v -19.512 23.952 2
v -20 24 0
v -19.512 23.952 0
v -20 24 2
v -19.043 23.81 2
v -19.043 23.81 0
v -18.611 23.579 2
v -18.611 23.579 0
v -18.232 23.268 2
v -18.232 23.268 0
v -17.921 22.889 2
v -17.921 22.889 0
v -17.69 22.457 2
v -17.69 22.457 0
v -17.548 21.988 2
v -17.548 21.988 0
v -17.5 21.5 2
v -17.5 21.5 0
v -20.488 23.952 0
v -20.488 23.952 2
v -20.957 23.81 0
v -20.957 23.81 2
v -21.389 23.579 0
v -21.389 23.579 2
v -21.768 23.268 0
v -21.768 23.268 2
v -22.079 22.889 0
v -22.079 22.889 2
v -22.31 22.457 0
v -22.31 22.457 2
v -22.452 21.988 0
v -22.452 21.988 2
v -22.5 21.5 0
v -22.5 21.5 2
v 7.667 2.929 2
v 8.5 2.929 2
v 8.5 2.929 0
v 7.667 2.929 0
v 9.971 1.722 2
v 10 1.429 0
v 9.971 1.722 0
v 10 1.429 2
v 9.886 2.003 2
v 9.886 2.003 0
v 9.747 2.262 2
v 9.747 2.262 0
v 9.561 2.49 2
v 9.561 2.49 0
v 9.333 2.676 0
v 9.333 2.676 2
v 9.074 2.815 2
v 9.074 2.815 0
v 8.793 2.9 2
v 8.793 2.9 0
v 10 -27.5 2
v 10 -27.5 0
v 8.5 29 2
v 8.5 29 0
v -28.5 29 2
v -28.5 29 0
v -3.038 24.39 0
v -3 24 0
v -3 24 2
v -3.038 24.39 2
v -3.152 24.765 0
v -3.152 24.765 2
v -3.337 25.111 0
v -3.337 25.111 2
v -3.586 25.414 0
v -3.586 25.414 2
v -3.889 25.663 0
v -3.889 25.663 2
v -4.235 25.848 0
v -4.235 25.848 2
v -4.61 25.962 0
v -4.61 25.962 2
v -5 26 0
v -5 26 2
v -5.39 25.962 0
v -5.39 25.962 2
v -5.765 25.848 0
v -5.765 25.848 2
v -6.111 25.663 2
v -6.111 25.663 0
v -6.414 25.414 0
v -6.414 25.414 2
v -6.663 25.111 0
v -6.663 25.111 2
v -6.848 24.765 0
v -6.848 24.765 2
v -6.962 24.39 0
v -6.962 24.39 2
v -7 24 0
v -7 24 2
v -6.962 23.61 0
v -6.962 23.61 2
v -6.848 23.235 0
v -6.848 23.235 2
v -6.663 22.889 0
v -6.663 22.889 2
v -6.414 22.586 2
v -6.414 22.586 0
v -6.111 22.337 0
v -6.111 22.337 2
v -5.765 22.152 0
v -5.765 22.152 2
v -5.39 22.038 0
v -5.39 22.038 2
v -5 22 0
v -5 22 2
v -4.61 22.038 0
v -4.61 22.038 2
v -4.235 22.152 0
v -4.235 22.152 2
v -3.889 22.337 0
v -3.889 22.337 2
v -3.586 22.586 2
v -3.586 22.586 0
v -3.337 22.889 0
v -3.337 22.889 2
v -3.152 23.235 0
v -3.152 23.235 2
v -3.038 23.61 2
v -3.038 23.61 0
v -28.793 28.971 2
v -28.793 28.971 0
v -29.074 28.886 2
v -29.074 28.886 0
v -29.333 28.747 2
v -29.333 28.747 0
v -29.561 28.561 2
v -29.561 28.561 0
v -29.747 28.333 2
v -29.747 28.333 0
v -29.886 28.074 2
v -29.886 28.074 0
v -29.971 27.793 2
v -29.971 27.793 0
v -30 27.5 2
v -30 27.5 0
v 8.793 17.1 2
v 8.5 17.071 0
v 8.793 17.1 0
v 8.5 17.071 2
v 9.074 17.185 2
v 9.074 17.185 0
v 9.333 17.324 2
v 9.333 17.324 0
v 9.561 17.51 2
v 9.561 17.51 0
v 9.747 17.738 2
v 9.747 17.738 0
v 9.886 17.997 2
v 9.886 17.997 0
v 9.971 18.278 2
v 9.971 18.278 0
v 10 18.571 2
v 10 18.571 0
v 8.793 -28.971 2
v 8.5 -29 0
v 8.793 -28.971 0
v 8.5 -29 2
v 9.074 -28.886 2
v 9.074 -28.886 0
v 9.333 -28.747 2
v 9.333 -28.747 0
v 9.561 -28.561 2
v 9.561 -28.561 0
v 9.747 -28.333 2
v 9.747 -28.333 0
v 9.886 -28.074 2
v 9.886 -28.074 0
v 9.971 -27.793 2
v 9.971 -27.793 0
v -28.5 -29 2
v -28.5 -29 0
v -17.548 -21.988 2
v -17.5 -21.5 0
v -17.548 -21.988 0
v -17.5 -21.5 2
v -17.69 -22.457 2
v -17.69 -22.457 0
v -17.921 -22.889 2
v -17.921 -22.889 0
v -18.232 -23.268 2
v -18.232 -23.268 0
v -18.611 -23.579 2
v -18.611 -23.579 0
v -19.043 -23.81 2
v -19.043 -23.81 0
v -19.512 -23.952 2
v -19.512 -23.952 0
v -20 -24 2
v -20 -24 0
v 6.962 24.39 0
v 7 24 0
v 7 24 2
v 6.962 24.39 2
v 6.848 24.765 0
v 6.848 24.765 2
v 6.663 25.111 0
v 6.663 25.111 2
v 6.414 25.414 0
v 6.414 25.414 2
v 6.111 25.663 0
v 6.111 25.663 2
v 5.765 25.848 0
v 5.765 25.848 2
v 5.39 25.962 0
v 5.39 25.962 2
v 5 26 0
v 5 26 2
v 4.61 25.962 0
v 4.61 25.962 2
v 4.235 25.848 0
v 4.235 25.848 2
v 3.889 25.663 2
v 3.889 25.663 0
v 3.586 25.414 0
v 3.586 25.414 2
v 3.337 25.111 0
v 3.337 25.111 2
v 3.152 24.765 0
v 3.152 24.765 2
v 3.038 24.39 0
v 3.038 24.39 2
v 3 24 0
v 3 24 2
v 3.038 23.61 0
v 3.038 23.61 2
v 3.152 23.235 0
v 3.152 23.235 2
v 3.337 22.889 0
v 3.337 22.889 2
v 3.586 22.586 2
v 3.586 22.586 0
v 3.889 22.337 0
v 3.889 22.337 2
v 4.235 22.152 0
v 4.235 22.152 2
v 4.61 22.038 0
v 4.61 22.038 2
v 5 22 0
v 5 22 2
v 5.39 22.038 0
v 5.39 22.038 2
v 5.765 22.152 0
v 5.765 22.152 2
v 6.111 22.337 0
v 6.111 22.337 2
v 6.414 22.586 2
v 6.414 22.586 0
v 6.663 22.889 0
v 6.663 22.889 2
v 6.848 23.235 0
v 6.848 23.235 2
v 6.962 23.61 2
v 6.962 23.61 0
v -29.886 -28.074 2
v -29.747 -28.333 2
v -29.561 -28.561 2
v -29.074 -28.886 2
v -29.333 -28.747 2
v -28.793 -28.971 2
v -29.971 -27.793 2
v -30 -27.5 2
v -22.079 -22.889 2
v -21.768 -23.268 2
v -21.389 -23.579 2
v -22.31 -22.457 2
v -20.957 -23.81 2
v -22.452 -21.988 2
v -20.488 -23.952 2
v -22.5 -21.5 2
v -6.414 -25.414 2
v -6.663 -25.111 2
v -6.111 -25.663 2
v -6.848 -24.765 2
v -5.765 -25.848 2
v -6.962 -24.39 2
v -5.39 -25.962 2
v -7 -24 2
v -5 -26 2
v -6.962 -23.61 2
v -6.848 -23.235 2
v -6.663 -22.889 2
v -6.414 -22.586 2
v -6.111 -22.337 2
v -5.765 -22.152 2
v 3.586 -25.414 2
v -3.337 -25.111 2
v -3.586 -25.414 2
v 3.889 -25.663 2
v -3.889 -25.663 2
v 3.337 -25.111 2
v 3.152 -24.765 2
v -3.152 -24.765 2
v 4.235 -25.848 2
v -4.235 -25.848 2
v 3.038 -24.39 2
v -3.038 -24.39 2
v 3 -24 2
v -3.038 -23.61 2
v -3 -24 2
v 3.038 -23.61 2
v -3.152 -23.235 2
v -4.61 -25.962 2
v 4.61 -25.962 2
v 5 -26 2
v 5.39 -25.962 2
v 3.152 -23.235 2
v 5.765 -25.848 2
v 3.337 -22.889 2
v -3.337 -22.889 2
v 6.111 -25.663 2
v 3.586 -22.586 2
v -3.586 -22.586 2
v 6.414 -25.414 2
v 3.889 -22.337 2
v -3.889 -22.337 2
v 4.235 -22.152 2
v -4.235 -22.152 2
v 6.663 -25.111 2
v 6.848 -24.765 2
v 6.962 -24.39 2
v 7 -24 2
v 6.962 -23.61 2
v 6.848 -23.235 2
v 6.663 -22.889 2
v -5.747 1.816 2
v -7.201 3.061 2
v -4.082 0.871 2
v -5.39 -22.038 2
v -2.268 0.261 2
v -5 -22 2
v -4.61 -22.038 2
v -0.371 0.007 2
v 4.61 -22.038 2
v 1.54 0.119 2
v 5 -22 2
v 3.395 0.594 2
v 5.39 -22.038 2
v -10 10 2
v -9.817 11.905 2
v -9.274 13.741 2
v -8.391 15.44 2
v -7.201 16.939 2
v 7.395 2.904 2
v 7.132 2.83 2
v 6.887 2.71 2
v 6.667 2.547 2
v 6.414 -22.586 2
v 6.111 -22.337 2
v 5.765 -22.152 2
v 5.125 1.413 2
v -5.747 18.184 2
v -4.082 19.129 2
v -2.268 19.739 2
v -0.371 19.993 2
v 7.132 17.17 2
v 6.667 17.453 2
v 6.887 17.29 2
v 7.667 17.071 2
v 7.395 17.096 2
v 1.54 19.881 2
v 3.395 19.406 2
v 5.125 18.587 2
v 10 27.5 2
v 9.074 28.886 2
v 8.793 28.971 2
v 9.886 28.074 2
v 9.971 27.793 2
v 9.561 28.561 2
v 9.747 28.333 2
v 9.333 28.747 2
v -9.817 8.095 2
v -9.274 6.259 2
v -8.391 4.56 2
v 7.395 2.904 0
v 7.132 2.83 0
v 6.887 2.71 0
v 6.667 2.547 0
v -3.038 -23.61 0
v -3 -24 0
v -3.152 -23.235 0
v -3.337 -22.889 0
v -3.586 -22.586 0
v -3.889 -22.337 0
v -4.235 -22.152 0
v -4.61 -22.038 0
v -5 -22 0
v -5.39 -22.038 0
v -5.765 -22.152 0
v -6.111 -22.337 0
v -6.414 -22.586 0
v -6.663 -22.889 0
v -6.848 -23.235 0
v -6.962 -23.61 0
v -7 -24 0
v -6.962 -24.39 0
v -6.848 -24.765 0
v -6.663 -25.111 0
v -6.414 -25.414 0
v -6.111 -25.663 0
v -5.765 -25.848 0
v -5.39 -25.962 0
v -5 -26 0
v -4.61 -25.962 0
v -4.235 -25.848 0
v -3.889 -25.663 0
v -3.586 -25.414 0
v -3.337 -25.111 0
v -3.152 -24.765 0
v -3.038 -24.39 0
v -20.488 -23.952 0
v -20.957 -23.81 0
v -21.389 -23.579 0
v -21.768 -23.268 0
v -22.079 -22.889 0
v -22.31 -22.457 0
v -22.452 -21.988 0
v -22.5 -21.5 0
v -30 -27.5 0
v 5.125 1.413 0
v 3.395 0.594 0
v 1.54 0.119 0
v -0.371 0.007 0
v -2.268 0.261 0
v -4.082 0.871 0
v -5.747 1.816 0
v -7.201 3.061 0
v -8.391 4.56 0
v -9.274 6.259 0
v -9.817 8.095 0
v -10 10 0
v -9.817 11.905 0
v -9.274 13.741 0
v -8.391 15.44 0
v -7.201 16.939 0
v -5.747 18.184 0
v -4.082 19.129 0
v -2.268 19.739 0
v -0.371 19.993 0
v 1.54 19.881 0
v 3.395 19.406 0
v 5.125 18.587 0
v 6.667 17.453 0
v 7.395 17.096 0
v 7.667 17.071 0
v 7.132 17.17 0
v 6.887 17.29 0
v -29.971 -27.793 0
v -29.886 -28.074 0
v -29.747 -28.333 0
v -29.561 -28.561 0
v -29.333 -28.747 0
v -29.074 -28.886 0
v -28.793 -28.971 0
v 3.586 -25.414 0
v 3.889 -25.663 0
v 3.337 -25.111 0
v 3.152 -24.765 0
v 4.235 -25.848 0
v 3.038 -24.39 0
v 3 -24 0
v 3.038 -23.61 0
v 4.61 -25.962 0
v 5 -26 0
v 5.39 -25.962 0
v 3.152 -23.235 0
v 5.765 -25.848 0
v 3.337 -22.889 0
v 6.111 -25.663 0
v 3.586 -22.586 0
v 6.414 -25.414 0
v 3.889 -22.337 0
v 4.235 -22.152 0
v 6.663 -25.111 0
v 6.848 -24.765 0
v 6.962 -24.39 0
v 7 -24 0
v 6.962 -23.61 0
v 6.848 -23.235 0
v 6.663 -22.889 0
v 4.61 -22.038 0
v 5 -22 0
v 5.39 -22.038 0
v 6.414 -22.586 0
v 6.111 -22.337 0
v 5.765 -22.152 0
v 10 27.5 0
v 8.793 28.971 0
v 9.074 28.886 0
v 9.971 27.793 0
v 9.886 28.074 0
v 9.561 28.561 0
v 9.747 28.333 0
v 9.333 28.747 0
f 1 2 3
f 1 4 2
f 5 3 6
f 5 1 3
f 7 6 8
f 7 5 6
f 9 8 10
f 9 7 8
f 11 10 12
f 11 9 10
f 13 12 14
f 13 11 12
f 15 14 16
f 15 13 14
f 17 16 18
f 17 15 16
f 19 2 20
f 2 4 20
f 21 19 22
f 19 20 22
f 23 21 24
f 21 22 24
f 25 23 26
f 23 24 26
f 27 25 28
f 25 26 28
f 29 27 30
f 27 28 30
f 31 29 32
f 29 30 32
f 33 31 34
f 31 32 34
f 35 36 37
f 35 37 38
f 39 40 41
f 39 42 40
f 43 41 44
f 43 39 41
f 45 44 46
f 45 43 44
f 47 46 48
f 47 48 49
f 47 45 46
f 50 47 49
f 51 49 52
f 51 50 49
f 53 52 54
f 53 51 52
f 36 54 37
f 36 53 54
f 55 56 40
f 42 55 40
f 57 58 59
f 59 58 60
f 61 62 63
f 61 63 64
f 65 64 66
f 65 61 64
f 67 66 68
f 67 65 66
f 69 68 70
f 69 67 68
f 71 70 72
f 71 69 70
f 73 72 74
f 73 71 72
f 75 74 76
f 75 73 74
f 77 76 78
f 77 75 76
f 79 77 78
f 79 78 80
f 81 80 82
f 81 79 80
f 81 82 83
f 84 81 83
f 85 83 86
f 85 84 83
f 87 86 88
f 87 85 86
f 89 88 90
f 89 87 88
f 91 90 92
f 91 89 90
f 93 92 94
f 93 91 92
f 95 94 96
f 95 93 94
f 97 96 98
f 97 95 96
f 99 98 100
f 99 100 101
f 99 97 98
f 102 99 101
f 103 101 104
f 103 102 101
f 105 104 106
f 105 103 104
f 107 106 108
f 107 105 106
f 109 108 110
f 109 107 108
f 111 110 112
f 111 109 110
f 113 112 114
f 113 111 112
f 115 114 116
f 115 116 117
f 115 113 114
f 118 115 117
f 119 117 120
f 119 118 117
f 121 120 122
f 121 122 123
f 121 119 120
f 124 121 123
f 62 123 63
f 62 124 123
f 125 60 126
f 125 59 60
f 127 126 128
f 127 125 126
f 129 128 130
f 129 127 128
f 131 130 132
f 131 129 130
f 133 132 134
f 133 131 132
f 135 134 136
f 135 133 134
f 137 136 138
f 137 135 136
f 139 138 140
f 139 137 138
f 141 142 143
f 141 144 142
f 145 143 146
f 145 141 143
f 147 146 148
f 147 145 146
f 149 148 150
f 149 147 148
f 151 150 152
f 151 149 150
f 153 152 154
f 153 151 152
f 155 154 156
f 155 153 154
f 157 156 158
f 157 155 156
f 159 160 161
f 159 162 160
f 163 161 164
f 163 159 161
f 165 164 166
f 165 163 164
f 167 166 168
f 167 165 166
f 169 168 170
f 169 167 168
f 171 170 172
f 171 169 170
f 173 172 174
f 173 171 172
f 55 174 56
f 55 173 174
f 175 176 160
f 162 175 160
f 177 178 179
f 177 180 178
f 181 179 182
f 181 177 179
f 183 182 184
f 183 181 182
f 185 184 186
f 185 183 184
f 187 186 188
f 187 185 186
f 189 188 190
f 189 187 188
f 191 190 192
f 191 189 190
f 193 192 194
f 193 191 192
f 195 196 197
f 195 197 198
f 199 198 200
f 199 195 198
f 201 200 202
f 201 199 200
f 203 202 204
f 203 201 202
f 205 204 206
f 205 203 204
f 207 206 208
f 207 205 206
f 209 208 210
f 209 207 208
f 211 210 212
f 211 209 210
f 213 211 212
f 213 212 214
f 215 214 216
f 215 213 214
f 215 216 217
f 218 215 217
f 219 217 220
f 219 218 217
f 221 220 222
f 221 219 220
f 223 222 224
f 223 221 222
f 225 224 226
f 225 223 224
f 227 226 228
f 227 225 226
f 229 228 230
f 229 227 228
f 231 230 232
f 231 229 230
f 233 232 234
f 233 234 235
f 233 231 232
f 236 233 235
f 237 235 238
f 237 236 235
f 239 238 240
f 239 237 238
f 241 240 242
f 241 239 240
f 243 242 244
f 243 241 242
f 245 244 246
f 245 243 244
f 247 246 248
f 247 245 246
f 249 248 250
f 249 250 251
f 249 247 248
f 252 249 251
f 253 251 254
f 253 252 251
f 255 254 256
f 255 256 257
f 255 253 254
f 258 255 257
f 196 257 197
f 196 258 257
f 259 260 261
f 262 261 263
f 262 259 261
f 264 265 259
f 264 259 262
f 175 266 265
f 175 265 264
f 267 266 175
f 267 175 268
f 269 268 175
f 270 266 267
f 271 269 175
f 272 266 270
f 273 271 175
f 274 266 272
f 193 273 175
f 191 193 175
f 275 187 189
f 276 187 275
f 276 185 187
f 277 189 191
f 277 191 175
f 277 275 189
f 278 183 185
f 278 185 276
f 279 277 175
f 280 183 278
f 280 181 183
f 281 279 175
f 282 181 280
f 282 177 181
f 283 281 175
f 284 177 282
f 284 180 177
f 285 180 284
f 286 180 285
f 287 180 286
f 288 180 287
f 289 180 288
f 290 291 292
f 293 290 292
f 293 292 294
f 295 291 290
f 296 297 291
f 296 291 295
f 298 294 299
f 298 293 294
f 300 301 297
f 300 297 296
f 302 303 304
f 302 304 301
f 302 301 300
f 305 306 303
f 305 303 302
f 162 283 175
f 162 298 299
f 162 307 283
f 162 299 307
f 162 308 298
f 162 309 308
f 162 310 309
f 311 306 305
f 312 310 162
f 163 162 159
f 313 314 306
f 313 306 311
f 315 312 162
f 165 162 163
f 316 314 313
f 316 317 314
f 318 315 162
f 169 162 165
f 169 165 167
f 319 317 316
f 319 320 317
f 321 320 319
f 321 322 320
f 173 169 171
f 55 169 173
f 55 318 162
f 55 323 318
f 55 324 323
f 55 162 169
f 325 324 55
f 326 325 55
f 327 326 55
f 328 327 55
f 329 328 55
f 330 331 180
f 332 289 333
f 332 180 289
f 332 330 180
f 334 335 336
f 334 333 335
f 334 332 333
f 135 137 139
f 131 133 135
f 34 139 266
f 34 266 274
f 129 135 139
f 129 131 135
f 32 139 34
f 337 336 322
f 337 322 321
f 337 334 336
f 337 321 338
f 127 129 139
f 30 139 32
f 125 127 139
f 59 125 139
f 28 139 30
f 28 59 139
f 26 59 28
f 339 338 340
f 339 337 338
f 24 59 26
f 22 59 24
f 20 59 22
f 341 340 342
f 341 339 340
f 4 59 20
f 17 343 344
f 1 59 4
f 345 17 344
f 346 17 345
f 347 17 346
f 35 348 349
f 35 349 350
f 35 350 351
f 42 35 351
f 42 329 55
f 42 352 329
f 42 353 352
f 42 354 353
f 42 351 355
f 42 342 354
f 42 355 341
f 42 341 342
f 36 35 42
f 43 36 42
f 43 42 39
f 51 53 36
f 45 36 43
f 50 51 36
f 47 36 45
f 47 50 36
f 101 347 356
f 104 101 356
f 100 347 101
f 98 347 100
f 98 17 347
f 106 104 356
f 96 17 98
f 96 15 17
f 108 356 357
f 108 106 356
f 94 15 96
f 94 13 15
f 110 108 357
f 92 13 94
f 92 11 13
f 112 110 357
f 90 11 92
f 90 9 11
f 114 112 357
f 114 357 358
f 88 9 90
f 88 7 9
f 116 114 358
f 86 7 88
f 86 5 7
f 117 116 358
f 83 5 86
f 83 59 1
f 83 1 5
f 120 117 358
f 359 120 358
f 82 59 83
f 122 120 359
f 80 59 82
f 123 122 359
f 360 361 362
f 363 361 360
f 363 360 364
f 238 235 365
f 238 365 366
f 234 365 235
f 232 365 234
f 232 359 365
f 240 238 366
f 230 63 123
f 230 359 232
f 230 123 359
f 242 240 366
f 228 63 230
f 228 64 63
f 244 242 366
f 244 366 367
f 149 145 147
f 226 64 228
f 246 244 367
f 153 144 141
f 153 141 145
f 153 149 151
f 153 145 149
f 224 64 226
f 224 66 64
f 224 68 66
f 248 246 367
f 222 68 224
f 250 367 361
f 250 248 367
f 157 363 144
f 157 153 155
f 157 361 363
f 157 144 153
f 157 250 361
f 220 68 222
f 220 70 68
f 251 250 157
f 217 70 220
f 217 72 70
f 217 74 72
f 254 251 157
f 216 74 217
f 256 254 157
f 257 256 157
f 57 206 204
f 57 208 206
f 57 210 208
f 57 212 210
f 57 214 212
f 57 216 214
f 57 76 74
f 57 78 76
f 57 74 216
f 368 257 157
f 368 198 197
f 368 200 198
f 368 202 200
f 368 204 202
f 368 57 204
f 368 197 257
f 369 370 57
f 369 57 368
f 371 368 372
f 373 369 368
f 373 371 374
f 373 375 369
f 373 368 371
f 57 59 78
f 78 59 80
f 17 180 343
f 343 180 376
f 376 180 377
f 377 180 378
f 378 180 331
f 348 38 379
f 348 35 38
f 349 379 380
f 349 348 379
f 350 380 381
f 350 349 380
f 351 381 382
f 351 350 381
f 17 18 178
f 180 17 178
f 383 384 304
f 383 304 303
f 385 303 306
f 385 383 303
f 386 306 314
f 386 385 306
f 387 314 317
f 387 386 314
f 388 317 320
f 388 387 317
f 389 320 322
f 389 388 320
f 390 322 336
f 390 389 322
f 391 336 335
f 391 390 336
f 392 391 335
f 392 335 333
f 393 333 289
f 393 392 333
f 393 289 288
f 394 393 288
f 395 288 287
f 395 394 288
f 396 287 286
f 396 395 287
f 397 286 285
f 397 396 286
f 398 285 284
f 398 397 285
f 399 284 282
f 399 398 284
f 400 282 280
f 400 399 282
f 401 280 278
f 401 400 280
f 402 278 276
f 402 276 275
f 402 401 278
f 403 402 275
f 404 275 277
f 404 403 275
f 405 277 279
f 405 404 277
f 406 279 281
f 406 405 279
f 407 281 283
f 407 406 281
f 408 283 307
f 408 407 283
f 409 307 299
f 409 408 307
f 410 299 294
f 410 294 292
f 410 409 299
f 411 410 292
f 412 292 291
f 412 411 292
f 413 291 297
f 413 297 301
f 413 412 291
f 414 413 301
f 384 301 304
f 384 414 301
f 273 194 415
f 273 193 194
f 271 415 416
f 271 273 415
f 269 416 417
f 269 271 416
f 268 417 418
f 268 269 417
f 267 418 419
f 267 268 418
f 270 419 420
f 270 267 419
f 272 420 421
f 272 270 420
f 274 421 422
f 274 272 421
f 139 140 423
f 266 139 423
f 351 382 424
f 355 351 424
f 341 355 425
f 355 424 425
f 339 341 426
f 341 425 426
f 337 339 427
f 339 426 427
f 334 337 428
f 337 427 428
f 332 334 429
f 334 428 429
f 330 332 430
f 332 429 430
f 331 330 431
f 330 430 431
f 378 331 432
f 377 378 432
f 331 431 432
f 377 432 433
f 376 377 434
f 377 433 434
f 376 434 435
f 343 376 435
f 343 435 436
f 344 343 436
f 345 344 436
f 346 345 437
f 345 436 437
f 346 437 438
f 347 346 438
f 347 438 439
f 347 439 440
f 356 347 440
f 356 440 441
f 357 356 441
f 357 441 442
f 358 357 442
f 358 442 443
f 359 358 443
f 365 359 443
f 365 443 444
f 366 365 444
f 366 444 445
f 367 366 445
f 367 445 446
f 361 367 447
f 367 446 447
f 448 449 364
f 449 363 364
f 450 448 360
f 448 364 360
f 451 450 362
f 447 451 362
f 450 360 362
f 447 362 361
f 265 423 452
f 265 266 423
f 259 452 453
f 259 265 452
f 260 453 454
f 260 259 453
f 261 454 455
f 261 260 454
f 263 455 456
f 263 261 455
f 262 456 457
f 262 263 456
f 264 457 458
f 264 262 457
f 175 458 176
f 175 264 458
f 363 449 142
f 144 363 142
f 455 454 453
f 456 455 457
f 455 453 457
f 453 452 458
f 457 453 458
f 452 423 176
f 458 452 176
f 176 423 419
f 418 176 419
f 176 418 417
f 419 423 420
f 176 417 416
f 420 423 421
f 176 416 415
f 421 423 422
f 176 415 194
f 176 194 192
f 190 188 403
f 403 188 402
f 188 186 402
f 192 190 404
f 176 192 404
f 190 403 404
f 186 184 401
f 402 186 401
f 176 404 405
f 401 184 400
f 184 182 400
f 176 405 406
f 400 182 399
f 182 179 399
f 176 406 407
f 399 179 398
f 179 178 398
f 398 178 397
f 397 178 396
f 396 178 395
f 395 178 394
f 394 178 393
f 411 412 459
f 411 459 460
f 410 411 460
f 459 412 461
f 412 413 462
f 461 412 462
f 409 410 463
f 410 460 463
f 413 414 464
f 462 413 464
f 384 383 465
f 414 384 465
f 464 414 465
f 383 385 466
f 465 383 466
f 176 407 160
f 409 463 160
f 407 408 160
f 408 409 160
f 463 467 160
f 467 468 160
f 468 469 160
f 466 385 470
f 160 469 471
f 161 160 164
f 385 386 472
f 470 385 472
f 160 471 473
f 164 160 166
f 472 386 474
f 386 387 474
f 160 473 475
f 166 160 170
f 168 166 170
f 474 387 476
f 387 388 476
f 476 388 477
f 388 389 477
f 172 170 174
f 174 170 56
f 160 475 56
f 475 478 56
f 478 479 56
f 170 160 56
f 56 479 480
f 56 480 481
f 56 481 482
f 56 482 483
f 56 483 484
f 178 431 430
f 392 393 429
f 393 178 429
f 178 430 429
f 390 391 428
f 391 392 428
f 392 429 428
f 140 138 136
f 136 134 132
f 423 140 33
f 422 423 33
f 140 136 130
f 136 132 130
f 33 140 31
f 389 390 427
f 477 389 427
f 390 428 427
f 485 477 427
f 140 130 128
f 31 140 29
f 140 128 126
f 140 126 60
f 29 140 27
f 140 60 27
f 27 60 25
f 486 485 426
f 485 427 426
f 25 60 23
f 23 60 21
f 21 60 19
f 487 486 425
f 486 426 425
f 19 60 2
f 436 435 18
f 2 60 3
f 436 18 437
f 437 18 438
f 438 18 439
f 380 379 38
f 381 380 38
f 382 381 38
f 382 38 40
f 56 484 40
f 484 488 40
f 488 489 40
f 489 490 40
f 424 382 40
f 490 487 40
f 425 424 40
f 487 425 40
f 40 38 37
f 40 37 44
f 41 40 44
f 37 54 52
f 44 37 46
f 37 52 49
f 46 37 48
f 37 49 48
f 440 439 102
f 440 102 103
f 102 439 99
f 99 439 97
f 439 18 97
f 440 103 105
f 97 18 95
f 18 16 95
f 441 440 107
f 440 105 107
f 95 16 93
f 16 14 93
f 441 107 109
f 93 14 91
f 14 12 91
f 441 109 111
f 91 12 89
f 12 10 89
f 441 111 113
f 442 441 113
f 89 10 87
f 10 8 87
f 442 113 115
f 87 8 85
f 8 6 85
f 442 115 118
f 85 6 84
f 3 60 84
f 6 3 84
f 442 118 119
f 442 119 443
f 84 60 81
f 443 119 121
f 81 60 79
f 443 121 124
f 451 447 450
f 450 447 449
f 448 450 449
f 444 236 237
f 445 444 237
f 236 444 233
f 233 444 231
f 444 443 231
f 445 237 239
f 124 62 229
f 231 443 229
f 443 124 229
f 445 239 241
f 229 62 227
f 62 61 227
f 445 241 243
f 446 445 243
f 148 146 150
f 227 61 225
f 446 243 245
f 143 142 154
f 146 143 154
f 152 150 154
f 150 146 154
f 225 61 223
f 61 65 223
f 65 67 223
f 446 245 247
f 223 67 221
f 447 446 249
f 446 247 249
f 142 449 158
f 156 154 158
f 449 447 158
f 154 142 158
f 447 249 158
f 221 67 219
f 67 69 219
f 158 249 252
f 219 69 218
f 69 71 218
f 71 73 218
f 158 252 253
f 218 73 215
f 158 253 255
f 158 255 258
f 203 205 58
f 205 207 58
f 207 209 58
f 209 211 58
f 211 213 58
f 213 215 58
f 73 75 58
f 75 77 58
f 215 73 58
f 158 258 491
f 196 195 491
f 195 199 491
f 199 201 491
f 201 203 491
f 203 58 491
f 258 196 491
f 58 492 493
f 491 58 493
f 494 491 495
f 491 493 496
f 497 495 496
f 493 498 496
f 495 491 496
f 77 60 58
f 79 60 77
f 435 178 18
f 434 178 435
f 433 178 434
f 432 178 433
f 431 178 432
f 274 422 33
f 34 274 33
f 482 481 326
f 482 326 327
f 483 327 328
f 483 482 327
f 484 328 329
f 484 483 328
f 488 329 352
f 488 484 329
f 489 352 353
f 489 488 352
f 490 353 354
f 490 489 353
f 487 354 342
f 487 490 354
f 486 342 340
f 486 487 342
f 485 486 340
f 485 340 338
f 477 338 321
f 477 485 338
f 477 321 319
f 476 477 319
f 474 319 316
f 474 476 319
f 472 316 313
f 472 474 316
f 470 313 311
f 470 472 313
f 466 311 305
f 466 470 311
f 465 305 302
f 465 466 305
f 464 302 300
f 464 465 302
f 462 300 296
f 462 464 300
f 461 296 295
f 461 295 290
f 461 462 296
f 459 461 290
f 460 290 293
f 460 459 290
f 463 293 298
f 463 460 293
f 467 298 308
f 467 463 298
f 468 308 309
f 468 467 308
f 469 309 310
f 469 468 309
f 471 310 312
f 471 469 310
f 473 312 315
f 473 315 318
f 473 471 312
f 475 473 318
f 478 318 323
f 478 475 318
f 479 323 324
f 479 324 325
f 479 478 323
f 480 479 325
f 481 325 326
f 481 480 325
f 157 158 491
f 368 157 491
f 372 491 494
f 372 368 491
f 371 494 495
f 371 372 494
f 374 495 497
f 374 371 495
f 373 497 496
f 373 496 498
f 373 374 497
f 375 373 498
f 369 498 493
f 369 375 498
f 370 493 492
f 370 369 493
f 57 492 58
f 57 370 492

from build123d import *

# Parameters (mm, degrees)
SKETCH_1_R      = 2
EXTRUDE_1_DEPTH = 2
FILLET_1_R      = 1.5
FILLET_2_R      = 2.5


with BuildPart() as part:
    # 草图1 → 凸台-拉伸1 (new body)
    with BuildSketch(Plane.XY):
        with BuildLine():
            Line((7.071067812, 17.071067812), (10, 17.071067812))
            Line((10, 17.071067812), (10, 29))
            Line((10, 29), (-15, 29))
            Line((-15, 29), (-30, 29))
            Line((-30, 29), (-30, -29))
            Line((-30, -29), (-15, -29))
            Line((-15, -29), (10, -29))
            Line((10, -29), (10, 2.928932188))
            Line((10, 2.928932188), (7.071067812, 2.928932188))
            ThreePointArc((7.071067812, 2.928932188), (-10, 10), (7.071067812, 17.071067812))
        make_face()
        with Locations((5, -24)):
            Circle(SKETCH_1_R, mode=Mode.SUBTRACT)
        with Locations((-5, -24)):
            Circle(SKETCH_1_R, mode=Mode.SUBTRACT)
        with Locations((-5, 24)):
            Circle(SKETCH_1_R, mode=Mode.SUBTRACT)
        with Locations((5, 24)):
            Circle(SKETCH_1_R, mode=Mode.SUBTRACT)
        Polygon((-20, 24), (-17.5, 24), (-17.5, -24), (-22.5, -24), (-22.5, 24), align=None, mode=Mode.SUBTRACT)
    extrude(amount=EXTRUDE_1_DEPTH)

    # 圆角1
    fillet_1_edges = [part.edges().sort_by_distance(p)[0] for p in [
        (7.071067812, 2.928932188, 1),
        (10, 2.928932188, 1),
        (10, -29, 1),
        (-30, -29, 1),
        (-30, 29, 1),
        (10, 29, 1),
        (10, 17.071067812, 1),
        (7.071067812, 17.071067812, 1),
    ]]
    fillet(fillet_1_edges, radius=FILLET_1_R)

    # 圆角2
    fillet_2_edges = [part.edges().sort_by_distance(p)[0] for p in [
        (-17.5, -24, 1),
        (-22.5, -24, 1),
        (-22.5, 24, 1),
        (-17.5, 24, 1),
    ]]
    fillet(fillet_2_edges, radius=FILLET_2_R - 0.0001)  # a hair under: the kernel refuses the full size


solid = part.part
